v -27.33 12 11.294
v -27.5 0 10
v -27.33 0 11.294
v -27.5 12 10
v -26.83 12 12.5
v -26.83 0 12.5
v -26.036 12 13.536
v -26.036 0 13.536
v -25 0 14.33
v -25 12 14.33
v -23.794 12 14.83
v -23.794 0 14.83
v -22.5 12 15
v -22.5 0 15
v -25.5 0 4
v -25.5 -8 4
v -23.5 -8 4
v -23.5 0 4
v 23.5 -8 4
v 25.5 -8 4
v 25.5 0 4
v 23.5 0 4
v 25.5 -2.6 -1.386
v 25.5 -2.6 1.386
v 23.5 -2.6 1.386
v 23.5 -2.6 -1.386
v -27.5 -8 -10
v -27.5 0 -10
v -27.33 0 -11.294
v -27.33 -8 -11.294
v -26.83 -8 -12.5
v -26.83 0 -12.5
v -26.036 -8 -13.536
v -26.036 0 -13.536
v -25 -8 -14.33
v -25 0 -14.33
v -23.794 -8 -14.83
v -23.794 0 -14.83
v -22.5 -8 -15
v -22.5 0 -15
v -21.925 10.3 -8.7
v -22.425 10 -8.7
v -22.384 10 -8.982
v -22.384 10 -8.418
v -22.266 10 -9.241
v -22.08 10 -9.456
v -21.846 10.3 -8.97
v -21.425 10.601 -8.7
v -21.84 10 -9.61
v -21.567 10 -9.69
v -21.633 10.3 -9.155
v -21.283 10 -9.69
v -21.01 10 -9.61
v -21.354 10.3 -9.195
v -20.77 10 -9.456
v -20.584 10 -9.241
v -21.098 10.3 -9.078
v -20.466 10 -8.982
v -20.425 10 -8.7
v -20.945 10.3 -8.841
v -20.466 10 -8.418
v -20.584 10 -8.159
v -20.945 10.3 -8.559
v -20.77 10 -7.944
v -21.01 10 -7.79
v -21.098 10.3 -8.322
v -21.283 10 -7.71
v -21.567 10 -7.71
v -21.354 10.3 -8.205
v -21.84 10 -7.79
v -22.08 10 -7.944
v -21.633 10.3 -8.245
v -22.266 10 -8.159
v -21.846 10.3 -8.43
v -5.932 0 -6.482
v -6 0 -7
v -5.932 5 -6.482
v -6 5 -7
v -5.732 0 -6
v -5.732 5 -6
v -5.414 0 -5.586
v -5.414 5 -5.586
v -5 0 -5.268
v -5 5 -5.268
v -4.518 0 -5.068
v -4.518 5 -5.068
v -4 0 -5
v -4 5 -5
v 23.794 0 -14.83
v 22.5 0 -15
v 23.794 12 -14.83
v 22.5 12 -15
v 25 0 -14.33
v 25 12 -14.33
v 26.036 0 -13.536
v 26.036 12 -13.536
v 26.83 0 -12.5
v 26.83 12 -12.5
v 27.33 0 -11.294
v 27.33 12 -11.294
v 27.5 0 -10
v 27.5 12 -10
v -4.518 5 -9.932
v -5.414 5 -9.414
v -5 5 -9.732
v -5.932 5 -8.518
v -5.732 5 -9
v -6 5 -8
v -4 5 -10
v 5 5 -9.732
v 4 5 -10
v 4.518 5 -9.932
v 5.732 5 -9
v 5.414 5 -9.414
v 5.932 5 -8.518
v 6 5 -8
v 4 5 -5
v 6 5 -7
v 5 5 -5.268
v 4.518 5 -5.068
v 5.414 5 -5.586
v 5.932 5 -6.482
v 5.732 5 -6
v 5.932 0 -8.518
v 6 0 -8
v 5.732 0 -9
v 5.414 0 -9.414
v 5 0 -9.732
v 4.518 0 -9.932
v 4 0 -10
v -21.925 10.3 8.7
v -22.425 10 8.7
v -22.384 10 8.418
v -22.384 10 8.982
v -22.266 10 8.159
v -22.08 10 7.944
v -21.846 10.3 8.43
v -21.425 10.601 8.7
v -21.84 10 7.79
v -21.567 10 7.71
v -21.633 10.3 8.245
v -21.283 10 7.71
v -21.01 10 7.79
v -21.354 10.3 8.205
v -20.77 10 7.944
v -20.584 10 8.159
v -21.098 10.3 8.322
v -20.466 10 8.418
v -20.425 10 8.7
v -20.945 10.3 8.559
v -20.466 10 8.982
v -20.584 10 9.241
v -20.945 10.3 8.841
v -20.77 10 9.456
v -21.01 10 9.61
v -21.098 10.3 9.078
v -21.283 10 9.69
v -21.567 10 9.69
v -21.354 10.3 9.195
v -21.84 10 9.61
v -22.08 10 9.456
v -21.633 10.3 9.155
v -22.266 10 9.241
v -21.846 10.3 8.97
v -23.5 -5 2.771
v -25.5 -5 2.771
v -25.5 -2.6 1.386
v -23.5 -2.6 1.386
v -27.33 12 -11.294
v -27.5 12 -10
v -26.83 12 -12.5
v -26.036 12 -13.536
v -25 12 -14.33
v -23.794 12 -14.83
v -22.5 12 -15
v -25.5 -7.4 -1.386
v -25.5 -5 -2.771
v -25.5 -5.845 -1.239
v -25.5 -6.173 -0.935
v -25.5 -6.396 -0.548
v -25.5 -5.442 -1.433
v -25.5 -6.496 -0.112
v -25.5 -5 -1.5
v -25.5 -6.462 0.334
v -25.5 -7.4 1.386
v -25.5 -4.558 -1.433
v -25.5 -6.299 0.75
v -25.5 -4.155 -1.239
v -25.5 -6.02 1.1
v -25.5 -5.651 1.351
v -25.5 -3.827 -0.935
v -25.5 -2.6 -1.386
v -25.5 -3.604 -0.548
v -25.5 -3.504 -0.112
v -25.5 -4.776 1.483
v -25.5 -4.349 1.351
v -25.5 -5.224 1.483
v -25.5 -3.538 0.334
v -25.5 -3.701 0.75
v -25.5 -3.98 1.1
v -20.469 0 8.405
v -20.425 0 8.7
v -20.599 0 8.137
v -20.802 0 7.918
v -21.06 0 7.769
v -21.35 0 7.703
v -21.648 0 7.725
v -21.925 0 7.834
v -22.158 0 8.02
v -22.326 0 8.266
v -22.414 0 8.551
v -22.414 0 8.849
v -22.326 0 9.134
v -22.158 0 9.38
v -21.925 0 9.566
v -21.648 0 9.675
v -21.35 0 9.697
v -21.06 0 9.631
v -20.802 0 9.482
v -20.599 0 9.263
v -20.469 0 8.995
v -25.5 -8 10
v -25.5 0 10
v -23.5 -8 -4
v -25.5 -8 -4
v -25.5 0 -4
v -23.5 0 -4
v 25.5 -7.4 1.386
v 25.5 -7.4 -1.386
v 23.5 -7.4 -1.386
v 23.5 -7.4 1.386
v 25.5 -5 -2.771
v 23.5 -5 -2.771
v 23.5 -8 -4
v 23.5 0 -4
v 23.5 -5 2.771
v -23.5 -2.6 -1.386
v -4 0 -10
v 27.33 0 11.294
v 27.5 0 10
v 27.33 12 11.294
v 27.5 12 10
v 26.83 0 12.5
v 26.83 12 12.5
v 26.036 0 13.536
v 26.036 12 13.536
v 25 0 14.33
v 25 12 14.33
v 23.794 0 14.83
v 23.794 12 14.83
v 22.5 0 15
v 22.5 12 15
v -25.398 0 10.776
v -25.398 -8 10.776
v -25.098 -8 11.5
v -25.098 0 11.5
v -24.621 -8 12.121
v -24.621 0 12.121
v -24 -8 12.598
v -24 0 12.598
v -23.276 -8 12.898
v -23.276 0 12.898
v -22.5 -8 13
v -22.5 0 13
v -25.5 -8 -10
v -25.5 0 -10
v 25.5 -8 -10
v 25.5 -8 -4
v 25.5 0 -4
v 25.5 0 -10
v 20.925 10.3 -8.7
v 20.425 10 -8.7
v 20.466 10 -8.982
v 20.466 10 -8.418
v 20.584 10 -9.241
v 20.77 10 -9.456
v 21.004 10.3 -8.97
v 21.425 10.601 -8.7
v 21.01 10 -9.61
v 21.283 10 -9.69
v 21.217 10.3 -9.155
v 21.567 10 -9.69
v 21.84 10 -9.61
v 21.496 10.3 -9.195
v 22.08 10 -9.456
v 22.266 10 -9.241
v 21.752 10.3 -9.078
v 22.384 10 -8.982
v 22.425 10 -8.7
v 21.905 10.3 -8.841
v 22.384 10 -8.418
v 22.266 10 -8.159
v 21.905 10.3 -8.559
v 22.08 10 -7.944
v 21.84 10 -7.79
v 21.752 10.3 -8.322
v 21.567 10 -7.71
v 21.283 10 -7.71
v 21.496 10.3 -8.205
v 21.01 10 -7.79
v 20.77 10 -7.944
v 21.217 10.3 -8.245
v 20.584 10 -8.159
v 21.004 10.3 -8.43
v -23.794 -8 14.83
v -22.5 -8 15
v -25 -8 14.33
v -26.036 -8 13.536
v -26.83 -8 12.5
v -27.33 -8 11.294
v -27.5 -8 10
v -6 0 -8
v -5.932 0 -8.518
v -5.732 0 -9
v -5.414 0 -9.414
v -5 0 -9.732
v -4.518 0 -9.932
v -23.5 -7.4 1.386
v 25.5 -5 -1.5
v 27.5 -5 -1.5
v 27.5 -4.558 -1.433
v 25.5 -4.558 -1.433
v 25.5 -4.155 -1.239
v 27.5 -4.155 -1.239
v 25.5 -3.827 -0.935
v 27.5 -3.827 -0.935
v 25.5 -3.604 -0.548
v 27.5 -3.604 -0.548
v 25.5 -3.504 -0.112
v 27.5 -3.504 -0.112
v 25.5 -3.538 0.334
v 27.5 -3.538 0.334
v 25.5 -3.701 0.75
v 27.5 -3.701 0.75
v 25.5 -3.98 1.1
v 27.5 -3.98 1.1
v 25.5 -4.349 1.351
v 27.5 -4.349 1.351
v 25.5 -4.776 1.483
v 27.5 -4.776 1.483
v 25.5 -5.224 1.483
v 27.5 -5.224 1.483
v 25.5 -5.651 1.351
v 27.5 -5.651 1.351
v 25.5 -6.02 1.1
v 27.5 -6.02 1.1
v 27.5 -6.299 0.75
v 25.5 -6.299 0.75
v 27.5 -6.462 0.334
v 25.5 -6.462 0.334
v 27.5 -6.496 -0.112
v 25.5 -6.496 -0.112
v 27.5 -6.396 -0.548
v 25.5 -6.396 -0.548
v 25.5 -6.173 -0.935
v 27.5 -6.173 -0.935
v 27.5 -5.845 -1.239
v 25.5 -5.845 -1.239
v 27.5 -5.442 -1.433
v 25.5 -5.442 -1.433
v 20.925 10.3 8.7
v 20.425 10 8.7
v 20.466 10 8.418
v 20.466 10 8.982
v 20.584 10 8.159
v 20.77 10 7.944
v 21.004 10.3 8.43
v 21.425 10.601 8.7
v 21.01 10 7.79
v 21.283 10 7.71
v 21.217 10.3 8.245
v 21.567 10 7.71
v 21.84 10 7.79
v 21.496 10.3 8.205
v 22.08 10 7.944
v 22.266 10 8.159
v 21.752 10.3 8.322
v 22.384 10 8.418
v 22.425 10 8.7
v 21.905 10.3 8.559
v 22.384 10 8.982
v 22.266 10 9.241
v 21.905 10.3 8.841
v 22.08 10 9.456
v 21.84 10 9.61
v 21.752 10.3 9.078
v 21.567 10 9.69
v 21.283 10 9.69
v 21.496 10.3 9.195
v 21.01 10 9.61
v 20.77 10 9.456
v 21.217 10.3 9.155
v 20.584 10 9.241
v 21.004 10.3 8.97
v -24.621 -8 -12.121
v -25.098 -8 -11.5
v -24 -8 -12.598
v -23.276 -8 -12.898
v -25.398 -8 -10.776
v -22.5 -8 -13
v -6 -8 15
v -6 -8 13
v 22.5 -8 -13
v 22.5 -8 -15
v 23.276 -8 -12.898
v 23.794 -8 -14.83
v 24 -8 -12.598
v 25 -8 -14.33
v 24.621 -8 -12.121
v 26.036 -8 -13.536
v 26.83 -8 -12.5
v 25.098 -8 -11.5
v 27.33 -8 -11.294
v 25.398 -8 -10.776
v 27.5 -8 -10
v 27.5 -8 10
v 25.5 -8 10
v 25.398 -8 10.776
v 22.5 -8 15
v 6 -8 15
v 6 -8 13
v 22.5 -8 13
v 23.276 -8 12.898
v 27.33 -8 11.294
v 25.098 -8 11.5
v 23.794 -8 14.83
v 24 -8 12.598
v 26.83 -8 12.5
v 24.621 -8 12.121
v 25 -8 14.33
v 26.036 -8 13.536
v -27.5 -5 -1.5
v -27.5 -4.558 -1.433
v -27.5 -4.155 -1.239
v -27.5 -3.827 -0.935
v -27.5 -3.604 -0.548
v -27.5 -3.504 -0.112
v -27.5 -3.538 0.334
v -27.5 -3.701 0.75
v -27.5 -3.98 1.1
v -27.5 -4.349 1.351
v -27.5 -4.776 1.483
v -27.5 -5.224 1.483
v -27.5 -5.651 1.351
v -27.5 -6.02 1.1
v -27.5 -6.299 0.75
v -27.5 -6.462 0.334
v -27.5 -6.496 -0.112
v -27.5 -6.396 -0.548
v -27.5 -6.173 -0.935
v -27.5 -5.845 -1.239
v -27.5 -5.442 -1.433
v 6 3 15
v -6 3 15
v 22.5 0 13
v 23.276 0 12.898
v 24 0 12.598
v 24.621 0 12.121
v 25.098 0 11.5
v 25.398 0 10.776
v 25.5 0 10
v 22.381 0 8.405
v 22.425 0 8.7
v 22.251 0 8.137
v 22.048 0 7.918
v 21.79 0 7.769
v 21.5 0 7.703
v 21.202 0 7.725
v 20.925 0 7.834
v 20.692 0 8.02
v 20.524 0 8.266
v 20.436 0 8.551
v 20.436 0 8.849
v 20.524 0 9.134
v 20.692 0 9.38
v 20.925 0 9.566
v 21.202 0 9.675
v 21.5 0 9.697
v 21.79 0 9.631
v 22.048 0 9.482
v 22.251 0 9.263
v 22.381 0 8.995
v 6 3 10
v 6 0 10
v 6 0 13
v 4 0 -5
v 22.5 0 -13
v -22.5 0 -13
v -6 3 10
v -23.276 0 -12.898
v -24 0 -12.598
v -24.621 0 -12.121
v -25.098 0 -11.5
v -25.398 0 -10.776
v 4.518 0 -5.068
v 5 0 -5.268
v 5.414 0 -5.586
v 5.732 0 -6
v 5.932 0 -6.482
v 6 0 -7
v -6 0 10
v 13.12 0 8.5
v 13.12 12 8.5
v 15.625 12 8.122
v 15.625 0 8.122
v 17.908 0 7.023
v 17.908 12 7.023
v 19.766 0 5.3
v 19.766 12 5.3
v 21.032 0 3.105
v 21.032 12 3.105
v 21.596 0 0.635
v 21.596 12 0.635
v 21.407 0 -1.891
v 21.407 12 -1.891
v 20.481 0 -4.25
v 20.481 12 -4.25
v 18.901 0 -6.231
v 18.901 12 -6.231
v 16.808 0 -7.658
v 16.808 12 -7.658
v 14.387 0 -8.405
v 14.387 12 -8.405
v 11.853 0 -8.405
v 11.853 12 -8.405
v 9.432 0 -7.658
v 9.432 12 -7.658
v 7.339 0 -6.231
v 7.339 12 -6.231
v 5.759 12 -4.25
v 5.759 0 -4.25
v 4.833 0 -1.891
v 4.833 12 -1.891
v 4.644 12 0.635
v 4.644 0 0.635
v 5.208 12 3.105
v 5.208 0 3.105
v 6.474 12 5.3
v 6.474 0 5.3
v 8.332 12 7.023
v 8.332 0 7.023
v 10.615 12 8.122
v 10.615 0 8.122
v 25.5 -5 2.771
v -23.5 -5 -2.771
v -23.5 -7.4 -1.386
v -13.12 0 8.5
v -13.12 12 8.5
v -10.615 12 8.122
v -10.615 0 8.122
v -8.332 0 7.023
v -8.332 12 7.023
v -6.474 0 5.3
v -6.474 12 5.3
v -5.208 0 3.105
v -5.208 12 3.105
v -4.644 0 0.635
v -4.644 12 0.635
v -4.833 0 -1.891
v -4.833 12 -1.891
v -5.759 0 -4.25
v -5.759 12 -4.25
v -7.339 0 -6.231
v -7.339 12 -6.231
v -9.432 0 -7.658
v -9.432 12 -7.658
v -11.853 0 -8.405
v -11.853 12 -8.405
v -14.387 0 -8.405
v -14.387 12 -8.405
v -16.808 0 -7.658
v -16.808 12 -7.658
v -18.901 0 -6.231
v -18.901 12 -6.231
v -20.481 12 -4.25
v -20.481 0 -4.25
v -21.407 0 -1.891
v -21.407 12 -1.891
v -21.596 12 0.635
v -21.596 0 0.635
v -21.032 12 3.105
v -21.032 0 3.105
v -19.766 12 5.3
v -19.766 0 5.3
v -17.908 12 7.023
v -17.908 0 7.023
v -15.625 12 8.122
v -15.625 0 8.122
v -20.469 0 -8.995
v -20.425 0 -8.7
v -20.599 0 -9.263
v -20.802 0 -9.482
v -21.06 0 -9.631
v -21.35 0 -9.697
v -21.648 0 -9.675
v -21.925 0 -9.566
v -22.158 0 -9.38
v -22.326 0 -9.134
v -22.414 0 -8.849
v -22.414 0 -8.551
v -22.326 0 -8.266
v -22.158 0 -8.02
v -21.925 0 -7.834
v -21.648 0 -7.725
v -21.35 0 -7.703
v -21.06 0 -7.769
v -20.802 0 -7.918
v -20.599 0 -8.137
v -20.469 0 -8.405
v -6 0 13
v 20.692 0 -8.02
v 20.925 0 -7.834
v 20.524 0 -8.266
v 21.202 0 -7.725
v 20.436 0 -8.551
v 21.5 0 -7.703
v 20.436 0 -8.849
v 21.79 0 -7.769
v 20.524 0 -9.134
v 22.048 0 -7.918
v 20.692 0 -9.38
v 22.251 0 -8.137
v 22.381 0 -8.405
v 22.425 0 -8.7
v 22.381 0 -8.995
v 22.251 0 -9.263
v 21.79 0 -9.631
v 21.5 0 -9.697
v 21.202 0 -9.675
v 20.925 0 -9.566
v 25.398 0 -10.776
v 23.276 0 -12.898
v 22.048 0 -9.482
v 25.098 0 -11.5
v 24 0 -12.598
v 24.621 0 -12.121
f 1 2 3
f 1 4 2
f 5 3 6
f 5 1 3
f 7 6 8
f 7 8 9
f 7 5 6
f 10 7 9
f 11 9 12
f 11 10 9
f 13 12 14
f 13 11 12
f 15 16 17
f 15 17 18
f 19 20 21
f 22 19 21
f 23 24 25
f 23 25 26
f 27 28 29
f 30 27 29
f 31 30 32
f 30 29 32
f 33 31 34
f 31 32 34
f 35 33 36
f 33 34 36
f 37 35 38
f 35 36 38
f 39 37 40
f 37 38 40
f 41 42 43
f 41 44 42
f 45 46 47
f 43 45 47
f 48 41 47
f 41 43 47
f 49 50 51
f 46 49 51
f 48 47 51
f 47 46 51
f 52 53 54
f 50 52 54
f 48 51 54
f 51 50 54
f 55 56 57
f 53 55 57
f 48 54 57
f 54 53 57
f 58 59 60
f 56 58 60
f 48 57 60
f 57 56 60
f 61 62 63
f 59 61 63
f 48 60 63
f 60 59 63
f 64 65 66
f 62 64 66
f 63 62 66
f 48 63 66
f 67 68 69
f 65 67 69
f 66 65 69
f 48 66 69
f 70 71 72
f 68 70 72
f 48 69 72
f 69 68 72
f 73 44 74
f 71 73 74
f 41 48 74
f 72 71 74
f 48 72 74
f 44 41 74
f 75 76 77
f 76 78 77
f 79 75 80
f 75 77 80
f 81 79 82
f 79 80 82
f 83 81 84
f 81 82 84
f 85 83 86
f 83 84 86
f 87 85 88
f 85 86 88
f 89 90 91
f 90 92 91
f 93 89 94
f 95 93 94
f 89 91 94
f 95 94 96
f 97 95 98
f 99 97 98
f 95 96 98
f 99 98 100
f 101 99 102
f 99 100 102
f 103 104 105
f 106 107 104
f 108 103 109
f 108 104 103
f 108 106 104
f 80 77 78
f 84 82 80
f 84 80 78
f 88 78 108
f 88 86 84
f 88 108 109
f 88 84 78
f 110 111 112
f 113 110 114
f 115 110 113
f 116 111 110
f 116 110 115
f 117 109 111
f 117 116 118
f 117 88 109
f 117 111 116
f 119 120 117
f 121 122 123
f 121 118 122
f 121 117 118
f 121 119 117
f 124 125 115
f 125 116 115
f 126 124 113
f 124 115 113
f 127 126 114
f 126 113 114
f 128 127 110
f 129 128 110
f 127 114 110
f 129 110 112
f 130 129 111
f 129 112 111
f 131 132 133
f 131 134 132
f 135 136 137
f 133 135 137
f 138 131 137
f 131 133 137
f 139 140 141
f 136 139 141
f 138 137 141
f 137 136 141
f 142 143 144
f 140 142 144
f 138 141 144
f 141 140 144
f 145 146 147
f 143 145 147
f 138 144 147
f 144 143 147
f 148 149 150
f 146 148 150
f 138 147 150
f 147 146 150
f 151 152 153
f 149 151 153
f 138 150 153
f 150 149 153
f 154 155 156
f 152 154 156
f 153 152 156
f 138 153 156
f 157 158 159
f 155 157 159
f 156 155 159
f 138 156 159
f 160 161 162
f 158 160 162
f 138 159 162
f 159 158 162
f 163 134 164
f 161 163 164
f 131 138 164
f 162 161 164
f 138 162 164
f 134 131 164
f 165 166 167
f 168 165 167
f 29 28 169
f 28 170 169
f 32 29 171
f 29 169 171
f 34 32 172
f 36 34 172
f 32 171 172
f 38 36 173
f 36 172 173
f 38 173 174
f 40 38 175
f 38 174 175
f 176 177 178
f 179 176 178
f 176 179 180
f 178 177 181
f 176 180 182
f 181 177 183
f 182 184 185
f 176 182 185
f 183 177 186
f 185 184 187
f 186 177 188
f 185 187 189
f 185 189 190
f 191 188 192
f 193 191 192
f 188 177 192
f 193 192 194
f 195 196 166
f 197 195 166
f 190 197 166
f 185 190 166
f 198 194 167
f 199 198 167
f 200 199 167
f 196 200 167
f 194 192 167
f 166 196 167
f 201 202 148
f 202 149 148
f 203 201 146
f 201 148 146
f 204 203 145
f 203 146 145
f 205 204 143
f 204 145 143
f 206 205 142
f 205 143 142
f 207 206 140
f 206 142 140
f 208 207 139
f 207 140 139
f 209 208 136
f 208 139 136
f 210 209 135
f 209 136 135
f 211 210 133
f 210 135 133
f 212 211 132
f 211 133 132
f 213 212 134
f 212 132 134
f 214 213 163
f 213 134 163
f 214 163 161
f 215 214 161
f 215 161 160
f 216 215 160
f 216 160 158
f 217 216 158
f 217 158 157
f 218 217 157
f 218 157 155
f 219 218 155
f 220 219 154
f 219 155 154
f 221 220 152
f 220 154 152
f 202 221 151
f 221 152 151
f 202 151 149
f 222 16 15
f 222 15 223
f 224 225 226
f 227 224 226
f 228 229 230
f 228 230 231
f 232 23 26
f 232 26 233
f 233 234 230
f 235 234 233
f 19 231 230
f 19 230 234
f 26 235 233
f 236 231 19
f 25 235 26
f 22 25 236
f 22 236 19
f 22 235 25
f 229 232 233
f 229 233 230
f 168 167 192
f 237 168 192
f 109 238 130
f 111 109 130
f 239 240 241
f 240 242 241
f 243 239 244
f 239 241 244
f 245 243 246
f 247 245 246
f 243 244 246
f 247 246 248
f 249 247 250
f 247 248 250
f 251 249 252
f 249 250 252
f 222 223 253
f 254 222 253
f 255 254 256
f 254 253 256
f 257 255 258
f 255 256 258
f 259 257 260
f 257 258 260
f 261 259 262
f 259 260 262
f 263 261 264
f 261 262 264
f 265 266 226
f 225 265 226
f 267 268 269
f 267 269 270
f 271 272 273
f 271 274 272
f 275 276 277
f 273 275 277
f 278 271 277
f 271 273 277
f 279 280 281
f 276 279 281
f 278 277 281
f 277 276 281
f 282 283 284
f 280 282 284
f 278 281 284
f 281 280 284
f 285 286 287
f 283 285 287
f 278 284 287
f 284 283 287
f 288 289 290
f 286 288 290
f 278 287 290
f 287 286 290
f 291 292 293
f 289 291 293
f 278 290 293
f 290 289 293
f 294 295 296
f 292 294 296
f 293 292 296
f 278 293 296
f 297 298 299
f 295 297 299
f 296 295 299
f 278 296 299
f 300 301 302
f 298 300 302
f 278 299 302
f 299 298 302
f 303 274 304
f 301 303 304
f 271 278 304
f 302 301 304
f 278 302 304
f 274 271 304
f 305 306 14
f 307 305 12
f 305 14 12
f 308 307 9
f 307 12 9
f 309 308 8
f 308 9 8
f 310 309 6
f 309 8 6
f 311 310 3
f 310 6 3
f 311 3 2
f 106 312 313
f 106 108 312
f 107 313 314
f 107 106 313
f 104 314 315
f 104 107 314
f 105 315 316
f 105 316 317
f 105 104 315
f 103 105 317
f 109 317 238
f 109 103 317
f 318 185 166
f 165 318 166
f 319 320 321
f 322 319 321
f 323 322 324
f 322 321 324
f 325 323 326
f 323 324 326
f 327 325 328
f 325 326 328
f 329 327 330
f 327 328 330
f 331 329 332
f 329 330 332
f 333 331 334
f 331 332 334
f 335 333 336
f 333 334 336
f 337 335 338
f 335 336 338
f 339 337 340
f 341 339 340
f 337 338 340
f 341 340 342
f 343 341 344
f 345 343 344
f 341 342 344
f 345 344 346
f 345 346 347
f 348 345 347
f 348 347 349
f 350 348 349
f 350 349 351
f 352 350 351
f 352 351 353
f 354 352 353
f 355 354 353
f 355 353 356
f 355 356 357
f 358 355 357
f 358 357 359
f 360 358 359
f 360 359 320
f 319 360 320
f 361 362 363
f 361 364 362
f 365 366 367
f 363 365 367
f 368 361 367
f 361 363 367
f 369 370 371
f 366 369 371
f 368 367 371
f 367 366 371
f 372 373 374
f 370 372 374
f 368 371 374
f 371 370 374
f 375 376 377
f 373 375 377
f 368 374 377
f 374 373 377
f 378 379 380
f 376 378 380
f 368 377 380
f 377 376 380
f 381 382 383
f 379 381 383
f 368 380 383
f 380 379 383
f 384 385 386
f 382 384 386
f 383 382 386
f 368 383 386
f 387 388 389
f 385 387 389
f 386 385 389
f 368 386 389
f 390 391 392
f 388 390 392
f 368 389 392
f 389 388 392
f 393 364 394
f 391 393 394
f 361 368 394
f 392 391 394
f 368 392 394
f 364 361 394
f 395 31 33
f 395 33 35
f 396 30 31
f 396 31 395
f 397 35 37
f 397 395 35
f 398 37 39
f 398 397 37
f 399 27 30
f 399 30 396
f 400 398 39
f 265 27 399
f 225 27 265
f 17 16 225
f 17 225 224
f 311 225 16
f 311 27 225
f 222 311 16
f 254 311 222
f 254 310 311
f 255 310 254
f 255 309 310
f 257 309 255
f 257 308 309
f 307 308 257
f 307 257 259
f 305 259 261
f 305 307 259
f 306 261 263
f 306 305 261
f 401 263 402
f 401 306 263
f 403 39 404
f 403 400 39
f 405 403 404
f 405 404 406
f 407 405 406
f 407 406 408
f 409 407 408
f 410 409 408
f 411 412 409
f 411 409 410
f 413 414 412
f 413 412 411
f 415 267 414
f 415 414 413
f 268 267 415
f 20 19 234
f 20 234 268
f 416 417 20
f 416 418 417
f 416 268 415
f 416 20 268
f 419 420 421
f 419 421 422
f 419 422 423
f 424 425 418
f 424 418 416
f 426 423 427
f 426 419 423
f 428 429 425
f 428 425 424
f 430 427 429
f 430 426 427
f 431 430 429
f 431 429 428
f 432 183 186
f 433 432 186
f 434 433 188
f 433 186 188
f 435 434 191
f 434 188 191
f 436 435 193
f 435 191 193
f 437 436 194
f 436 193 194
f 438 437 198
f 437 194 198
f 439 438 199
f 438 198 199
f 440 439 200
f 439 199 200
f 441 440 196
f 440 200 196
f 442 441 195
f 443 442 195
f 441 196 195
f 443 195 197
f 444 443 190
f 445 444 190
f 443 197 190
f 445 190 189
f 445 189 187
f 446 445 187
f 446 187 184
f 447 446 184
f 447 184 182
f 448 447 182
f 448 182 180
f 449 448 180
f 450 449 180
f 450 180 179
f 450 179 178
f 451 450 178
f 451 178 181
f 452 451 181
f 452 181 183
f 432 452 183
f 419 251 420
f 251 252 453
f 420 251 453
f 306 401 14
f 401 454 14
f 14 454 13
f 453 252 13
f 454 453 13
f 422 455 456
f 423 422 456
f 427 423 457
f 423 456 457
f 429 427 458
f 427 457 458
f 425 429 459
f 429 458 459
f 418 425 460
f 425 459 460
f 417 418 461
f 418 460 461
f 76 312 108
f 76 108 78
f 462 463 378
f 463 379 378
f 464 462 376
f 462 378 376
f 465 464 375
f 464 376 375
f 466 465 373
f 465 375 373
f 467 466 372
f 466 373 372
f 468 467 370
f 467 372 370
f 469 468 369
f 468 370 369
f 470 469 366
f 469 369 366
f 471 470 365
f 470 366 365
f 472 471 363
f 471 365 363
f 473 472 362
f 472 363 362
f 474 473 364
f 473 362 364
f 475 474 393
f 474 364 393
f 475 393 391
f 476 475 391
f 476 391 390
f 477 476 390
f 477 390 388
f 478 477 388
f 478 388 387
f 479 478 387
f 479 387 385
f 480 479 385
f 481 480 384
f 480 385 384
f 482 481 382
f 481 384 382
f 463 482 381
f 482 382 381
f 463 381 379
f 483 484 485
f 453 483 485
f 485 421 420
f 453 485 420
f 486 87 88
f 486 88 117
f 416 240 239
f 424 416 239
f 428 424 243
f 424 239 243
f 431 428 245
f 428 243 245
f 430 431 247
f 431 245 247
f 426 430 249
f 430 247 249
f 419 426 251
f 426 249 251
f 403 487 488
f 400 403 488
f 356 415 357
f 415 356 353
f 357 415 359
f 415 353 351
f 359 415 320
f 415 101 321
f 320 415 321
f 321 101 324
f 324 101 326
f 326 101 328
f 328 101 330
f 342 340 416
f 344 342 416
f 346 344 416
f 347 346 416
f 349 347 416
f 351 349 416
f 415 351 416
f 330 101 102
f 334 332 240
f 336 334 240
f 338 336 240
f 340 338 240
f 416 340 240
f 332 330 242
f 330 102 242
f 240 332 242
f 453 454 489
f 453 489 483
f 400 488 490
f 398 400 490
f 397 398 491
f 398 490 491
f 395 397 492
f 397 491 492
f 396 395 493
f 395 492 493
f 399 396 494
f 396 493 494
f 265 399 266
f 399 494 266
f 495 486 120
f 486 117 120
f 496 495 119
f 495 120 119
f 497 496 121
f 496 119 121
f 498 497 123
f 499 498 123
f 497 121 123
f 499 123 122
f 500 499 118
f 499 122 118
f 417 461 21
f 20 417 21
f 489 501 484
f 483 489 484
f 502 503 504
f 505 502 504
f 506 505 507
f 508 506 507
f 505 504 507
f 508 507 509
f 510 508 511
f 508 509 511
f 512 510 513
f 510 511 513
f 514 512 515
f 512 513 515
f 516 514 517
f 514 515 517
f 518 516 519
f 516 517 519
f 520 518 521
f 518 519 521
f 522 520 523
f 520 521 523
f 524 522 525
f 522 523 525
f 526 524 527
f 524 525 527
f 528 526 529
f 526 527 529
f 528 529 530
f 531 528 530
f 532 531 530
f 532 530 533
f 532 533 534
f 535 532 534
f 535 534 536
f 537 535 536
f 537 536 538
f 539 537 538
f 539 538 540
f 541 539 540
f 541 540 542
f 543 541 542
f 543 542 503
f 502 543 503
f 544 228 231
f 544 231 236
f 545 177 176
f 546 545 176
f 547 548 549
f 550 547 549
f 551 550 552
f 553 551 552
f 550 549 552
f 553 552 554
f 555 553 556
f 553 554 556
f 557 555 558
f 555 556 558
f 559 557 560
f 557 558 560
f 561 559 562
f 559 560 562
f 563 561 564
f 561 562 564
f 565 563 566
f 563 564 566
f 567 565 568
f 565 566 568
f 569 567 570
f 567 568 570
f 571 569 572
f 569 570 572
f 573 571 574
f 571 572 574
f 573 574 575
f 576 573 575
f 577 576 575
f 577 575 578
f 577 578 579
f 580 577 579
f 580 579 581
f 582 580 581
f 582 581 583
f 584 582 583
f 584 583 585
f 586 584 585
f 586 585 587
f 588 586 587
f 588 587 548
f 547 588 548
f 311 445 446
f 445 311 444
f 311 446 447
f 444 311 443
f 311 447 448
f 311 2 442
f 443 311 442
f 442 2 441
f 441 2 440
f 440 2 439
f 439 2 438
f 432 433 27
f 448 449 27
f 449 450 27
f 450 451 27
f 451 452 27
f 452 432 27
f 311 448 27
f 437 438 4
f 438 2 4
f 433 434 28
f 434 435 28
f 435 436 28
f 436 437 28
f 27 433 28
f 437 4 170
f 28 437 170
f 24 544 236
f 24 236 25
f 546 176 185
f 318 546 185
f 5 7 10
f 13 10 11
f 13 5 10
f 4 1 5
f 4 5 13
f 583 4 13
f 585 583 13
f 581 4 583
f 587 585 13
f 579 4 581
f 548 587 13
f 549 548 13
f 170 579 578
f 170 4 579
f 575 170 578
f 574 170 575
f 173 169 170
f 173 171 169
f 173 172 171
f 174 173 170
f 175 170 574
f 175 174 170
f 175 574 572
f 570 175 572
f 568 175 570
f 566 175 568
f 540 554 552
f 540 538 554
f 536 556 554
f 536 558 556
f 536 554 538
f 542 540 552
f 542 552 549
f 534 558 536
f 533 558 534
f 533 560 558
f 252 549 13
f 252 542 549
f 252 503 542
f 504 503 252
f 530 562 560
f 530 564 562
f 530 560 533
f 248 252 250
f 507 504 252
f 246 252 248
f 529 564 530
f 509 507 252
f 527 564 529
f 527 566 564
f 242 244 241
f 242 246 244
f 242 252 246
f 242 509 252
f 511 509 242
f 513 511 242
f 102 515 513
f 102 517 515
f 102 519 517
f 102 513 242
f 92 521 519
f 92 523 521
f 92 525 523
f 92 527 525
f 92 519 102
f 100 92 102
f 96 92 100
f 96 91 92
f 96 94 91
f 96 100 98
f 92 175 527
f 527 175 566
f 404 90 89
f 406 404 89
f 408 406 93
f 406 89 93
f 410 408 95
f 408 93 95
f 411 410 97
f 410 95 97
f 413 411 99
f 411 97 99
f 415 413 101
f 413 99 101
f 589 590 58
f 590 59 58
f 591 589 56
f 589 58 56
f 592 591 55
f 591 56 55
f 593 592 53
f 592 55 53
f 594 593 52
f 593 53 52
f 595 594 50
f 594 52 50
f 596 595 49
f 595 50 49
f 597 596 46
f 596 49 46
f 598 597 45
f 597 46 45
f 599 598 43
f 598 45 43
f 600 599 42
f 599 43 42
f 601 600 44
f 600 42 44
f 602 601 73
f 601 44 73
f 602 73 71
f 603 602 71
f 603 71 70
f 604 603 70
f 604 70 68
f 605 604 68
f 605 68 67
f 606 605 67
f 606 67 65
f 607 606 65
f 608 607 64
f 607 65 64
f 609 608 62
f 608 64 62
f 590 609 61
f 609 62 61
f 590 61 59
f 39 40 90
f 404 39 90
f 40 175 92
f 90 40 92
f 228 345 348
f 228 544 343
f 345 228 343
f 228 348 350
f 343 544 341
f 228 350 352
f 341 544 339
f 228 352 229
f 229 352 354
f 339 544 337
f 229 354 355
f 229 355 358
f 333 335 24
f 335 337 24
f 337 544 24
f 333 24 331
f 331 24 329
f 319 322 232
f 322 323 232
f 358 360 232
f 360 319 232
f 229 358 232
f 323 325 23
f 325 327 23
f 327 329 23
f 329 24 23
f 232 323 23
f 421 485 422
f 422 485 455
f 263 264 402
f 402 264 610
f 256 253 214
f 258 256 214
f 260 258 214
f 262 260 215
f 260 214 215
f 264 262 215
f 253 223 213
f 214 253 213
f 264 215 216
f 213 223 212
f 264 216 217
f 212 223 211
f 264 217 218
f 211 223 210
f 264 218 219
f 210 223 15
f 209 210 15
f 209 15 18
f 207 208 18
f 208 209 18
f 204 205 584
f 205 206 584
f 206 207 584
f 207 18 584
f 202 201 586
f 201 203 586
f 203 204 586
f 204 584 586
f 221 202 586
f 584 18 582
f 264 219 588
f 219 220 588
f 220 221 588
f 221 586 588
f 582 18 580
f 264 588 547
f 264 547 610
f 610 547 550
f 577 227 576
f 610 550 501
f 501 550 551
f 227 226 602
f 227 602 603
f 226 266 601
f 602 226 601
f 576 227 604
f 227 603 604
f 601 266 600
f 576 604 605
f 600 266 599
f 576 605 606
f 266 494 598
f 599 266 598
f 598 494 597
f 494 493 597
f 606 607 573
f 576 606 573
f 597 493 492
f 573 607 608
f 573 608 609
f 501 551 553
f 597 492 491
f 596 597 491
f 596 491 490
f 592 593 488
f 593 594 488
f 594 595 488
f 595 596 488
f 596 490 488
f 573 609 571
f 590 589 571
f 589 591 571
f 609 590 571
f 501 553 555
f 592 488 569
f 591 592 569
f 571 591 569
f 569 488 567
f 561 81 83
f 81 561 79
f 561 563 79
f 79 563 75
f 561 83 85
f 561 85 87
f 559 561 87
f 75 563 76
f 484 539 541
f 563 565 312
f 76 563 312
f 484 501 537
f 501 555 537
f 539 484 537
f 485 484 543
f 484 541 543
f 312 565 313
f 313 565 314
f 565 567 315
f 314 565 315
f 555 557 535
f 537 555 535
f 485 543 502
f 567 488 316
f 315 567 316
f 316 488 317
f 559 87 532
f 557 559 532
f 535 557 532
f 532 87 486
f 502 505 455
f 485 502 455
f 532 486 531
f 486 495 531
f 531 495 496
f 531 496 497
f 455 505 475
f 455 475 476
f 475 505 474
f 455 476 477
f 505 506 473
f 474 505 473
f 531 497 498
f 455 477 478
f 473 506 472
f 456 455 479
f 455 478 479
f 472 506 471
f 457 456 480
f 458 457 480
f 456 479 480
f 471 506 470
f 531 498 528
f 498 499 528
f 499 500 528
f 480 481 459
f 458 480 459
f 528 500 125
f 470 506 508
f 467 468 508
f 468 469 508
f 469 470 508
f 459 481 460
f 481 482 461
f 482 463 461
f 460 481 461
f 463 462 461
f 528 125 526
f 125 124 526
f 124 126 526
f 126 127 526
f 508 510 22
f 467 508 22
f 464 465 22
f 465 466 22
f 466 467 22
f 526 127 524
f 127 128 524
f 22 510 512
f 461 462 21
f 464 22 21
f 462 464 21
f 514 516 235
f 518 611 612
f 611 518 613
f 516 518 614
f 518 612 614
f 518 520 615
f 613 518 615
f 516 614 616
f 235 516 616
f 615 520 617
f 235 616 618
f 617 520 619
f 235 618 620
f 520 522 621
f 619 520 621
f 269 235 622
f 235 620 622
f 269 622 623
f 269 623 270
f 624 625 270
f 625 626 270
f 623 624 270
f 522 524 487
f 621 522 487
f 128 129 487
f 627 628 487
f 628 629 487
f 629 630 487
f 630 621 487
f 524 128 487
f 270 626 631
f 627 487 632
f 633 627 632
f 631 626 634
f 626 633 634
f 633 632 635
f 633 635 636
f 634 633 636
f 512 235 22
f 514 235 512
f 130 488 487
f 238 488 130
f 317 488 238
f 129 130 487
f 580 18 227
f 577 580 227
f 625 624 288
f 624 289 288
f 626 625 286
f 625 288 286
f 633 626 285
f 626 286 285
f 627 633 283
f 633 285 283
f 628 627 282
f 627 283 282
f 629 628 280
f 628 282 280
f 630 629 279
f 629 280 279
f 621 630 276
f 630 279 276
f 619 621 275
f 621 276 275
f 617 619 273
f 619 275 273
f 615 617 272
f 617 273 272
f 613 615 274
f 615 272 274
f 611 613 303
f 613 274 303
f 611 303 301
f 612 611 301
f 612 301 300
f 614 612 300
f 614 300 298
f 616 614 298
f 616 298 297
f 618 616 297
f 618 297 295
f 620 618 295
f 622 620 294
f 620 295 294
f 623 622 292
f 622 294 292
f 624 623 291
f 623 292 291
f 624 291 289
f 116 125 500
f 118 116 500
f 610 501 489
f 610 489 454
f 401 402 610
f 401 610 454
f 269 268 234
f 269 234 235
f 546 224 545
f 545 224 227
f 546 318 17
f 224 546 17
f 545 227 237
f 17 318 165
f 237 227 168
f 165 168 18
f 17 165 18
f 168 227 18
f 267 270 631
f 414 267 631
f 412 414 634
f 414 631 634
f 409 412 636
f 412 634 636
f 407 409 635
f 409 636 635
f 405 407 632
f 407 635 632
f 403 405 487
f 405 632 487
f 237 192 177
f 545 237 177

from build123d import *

# Parameters (mm, degrees)
SKETCH1_W                    = 55
SKETCH1_H                    = 30
BOSS_EXTRUDE1_DEPTH          = 12
SKETCH2_R                    = 8.5
CUT_EXTRUDE1_DEPTH           = 34.544746235
SKETCH4_W                    = 12
SKETCH4_H                    = 5
CUT_EXTRUDE2_DEPTH           = 5
FILLET1_R                    = 2
SKETCH5_W                    = 12
SKETCH5_H                    = 5
CUT_EXTRUDE3_DEPTH           = 3
FILLET2_R                    = 5
BOSS_EXTRUDE3_DEPTH          = 8
F_3_0MM_DOWEL_HOLE1_D        = 3
SKETCH10_W                   = 8
SKETCH10_H                   = 8
BOSS_EXTRUDE4_DEPTH          = 2
F_2_0_2_DIAMETER_HOLE1_D     = 2
F_2_0_2_DIAMETER_HOLE1_DEPTH = 10
F_2_0_2_DIAMETER_HOLE1_TIP   = 0.600860619


with BuildPart() as part:
    # Sketch1 → Boss-Extrude1 (new body)
    with BuildSketch(Plane(origin=(0, 0, 0), x_dir=(1, 0, 0), z_dir=(0, 1, 0))):
        Rectangle(SKETCH1_W, SKETCH1_H)
    extrude(amount=BOSS_EXTRUDE1_DEPTH)

    # Sketch2 → Cut-Extrude1 (cut, through all)
    with BuildSketch(Plane(origin=(0, 12, 0), x_dir=(1, 0, 0), z_dir=(0, 1, 0))):
        with Locations(Location((-13.12, 0, 0), (0, 0, 270))):
            Circle(SKETCH2_R)
        with Locations(Location((13.12, 0, 0), (0, 0, 270))):
            Circle(SKETCH2_R)
    extrude(amount=-CUT_EXTRUDE1_DEPTH, mode=Mode.SUBTRACT)

    # Sketch4 → Cut-Extrude2 (cut)
    with BuildSketch(Plane.XZ):
        with Locations((0, -7.5)):
            Rectangle(SKETCH4_W, SKETCH4_H)
    extrude(amount=-CUT_EXTRUDE2_DEPTH, mode=Mode.SUBTRACT)

    # Fillet1
    fillet1_edges = [part.edges().sort_by_distance(p)[0] for p in [
        (-6, 2.5, -10),
        (-6, 2.5, -5),
        (6, 2.5, -5),
        (6, 2.5, -10),
    ]]
    fillet(fillet1_edges, radius=FILLET1_R)

    # Sketch5 → Cut-Extrude3 (cut)
    with BuildSketch(Plane.XZ):
        with Locations((0, 12.5)):
            Rectangle(SKETCH5_W, SKETCH5_H)
    extrude(amount=-CUT_EXTRUDE3_DEPTH, mode=Mode.SUBTRACT)

    # Fillet2
    fillet2_edges = [part.edges().sort_by_distance(p)[0] for p in [
        (27.5, 6, 15),
        (-27.5, 6, 15),
        (-27.5, 6, -15),
        (27.5, 6, -15),
    ]]
    fillet(fillet2_edges, radius=FILLET2_R)

    # Sketch6 → Boss-Extrude3 (add)
    with BuildSketch(Plane.XZ):
        with BuildLine():
            Line((25.5, 10), (25.5, -10))
            ThreePointArc((25.5, -10), (24.621320344, -12.121320344), (22.5, -13))
            Line((22.5, -13), (-22.5, -13))
            ThreePointArc((-22.5, -13), (-24.621320344, -12.121320344), (-25.5, -10))
            Line((-25.5, -10), (-25.5, 10))
            ThreePointArc((-25.5, 10), (-24.621320344, 12.121320344), (-22.5, 13))
            Line((-22.5, 13), (-8, 13))
            Line((-8, 13), (-6, 13))
            Line((-6, 13), (-6, 15))
            Line((-6, 15), (-22.5, 15))
            ThreePointArc((-22.5, 15), (-26.035533906, 13.535533906), (-27.5, 10))
            Line((-27.5, 10), (-27.5, -10))
            ThreePointArc((-27.5, -10), (-26.035533906, -13.535533906), (-22.5, -15))
            Line((-22.5, -15), (22.5, -15))
            ThreePointArc((22.5, -15), (26.035533906, -13.535533906), (27.5, -10))
            Line((27.5, -10), (27.5, 10))
            ThreePointArc((27.5, 10), (26.035533906, 13.535533906), (22.5, 15))
            Line((22.5, 15), (6, 15))
            Line((6, 15), (6, 13))
            Line((6, 13), (8, 13))
            Line((8, 13), (22.5, 13))
            ThreePointArc((22.5, 13), (24.621320344, 12.121320344), (25.5, 10))
        make_face()
    extrude(amount=BOSS_EXTRUDE3_DEPTH)

    # Ø3.0mm Dowel Hole1 (through all)
    with Locations(Plane.ZY.offset(27.5)):
        with Locations((0, -5)):
            Hole(F_3_0MM_DOWEL_HOLE1_D / 2)

    # Sketch10 → Boss-Extrude4 (add)
    with BuildSketch(Plane.ZY.offset(-25.5)):
        with Locations((0, -4)):
            Rectangle(SKETCH10_W, SKETCH10_H)
        Polygon((2.771281292, -5), (1.385640646, -2.6), (-1.385640646, -2.6), (-2.771281292, -5), (-1.385640646, -7.4), (1.385640646, -7.4), align=None, mode=Mode.SUBTRACT)
    boss_extrude4 = extrude(amount=BOSS_EXTRUDE4_DEPTH)

    # Mirror1: Boss-Extrude4 across plane
    add(boss_extrude4.mirror(Plane(origin=(0, 0, 0), x_dir=(0, 0, 1), z_dir=(1, 0, 0))))

    # Ø2.0 (2) Diameter Hole1
    with Locations(Plane(origin=(0, 0, 0), x_dir=(-1, 0, 0), z_dir=(0, -1, 0))):
        with Locations((-21.425, 8.7), (21.425, 8.7), (21.425, -8.7), (-21.425, -8.7)):
            Hole(F_2_0_2_DIAMETER_HOLE1_D / 2, depth=F_2_0_2_DIAMETER_HOLE1_DEPTH)
            with Locations((0, 0, -(F_2_0_2_DIAMETER_HOLE1_DEPTH + F_2_0_2_DIAMETER_HOLE1_TIP / 2))):  # 118° drill point
                Cone(0, F_2_0_2_DIAMETER_HOLE1_D / 2, F_2_0_2_DIAMETER_HOLE1_TIP, mode=Mode.SUBTRACT)


solid = part.part
